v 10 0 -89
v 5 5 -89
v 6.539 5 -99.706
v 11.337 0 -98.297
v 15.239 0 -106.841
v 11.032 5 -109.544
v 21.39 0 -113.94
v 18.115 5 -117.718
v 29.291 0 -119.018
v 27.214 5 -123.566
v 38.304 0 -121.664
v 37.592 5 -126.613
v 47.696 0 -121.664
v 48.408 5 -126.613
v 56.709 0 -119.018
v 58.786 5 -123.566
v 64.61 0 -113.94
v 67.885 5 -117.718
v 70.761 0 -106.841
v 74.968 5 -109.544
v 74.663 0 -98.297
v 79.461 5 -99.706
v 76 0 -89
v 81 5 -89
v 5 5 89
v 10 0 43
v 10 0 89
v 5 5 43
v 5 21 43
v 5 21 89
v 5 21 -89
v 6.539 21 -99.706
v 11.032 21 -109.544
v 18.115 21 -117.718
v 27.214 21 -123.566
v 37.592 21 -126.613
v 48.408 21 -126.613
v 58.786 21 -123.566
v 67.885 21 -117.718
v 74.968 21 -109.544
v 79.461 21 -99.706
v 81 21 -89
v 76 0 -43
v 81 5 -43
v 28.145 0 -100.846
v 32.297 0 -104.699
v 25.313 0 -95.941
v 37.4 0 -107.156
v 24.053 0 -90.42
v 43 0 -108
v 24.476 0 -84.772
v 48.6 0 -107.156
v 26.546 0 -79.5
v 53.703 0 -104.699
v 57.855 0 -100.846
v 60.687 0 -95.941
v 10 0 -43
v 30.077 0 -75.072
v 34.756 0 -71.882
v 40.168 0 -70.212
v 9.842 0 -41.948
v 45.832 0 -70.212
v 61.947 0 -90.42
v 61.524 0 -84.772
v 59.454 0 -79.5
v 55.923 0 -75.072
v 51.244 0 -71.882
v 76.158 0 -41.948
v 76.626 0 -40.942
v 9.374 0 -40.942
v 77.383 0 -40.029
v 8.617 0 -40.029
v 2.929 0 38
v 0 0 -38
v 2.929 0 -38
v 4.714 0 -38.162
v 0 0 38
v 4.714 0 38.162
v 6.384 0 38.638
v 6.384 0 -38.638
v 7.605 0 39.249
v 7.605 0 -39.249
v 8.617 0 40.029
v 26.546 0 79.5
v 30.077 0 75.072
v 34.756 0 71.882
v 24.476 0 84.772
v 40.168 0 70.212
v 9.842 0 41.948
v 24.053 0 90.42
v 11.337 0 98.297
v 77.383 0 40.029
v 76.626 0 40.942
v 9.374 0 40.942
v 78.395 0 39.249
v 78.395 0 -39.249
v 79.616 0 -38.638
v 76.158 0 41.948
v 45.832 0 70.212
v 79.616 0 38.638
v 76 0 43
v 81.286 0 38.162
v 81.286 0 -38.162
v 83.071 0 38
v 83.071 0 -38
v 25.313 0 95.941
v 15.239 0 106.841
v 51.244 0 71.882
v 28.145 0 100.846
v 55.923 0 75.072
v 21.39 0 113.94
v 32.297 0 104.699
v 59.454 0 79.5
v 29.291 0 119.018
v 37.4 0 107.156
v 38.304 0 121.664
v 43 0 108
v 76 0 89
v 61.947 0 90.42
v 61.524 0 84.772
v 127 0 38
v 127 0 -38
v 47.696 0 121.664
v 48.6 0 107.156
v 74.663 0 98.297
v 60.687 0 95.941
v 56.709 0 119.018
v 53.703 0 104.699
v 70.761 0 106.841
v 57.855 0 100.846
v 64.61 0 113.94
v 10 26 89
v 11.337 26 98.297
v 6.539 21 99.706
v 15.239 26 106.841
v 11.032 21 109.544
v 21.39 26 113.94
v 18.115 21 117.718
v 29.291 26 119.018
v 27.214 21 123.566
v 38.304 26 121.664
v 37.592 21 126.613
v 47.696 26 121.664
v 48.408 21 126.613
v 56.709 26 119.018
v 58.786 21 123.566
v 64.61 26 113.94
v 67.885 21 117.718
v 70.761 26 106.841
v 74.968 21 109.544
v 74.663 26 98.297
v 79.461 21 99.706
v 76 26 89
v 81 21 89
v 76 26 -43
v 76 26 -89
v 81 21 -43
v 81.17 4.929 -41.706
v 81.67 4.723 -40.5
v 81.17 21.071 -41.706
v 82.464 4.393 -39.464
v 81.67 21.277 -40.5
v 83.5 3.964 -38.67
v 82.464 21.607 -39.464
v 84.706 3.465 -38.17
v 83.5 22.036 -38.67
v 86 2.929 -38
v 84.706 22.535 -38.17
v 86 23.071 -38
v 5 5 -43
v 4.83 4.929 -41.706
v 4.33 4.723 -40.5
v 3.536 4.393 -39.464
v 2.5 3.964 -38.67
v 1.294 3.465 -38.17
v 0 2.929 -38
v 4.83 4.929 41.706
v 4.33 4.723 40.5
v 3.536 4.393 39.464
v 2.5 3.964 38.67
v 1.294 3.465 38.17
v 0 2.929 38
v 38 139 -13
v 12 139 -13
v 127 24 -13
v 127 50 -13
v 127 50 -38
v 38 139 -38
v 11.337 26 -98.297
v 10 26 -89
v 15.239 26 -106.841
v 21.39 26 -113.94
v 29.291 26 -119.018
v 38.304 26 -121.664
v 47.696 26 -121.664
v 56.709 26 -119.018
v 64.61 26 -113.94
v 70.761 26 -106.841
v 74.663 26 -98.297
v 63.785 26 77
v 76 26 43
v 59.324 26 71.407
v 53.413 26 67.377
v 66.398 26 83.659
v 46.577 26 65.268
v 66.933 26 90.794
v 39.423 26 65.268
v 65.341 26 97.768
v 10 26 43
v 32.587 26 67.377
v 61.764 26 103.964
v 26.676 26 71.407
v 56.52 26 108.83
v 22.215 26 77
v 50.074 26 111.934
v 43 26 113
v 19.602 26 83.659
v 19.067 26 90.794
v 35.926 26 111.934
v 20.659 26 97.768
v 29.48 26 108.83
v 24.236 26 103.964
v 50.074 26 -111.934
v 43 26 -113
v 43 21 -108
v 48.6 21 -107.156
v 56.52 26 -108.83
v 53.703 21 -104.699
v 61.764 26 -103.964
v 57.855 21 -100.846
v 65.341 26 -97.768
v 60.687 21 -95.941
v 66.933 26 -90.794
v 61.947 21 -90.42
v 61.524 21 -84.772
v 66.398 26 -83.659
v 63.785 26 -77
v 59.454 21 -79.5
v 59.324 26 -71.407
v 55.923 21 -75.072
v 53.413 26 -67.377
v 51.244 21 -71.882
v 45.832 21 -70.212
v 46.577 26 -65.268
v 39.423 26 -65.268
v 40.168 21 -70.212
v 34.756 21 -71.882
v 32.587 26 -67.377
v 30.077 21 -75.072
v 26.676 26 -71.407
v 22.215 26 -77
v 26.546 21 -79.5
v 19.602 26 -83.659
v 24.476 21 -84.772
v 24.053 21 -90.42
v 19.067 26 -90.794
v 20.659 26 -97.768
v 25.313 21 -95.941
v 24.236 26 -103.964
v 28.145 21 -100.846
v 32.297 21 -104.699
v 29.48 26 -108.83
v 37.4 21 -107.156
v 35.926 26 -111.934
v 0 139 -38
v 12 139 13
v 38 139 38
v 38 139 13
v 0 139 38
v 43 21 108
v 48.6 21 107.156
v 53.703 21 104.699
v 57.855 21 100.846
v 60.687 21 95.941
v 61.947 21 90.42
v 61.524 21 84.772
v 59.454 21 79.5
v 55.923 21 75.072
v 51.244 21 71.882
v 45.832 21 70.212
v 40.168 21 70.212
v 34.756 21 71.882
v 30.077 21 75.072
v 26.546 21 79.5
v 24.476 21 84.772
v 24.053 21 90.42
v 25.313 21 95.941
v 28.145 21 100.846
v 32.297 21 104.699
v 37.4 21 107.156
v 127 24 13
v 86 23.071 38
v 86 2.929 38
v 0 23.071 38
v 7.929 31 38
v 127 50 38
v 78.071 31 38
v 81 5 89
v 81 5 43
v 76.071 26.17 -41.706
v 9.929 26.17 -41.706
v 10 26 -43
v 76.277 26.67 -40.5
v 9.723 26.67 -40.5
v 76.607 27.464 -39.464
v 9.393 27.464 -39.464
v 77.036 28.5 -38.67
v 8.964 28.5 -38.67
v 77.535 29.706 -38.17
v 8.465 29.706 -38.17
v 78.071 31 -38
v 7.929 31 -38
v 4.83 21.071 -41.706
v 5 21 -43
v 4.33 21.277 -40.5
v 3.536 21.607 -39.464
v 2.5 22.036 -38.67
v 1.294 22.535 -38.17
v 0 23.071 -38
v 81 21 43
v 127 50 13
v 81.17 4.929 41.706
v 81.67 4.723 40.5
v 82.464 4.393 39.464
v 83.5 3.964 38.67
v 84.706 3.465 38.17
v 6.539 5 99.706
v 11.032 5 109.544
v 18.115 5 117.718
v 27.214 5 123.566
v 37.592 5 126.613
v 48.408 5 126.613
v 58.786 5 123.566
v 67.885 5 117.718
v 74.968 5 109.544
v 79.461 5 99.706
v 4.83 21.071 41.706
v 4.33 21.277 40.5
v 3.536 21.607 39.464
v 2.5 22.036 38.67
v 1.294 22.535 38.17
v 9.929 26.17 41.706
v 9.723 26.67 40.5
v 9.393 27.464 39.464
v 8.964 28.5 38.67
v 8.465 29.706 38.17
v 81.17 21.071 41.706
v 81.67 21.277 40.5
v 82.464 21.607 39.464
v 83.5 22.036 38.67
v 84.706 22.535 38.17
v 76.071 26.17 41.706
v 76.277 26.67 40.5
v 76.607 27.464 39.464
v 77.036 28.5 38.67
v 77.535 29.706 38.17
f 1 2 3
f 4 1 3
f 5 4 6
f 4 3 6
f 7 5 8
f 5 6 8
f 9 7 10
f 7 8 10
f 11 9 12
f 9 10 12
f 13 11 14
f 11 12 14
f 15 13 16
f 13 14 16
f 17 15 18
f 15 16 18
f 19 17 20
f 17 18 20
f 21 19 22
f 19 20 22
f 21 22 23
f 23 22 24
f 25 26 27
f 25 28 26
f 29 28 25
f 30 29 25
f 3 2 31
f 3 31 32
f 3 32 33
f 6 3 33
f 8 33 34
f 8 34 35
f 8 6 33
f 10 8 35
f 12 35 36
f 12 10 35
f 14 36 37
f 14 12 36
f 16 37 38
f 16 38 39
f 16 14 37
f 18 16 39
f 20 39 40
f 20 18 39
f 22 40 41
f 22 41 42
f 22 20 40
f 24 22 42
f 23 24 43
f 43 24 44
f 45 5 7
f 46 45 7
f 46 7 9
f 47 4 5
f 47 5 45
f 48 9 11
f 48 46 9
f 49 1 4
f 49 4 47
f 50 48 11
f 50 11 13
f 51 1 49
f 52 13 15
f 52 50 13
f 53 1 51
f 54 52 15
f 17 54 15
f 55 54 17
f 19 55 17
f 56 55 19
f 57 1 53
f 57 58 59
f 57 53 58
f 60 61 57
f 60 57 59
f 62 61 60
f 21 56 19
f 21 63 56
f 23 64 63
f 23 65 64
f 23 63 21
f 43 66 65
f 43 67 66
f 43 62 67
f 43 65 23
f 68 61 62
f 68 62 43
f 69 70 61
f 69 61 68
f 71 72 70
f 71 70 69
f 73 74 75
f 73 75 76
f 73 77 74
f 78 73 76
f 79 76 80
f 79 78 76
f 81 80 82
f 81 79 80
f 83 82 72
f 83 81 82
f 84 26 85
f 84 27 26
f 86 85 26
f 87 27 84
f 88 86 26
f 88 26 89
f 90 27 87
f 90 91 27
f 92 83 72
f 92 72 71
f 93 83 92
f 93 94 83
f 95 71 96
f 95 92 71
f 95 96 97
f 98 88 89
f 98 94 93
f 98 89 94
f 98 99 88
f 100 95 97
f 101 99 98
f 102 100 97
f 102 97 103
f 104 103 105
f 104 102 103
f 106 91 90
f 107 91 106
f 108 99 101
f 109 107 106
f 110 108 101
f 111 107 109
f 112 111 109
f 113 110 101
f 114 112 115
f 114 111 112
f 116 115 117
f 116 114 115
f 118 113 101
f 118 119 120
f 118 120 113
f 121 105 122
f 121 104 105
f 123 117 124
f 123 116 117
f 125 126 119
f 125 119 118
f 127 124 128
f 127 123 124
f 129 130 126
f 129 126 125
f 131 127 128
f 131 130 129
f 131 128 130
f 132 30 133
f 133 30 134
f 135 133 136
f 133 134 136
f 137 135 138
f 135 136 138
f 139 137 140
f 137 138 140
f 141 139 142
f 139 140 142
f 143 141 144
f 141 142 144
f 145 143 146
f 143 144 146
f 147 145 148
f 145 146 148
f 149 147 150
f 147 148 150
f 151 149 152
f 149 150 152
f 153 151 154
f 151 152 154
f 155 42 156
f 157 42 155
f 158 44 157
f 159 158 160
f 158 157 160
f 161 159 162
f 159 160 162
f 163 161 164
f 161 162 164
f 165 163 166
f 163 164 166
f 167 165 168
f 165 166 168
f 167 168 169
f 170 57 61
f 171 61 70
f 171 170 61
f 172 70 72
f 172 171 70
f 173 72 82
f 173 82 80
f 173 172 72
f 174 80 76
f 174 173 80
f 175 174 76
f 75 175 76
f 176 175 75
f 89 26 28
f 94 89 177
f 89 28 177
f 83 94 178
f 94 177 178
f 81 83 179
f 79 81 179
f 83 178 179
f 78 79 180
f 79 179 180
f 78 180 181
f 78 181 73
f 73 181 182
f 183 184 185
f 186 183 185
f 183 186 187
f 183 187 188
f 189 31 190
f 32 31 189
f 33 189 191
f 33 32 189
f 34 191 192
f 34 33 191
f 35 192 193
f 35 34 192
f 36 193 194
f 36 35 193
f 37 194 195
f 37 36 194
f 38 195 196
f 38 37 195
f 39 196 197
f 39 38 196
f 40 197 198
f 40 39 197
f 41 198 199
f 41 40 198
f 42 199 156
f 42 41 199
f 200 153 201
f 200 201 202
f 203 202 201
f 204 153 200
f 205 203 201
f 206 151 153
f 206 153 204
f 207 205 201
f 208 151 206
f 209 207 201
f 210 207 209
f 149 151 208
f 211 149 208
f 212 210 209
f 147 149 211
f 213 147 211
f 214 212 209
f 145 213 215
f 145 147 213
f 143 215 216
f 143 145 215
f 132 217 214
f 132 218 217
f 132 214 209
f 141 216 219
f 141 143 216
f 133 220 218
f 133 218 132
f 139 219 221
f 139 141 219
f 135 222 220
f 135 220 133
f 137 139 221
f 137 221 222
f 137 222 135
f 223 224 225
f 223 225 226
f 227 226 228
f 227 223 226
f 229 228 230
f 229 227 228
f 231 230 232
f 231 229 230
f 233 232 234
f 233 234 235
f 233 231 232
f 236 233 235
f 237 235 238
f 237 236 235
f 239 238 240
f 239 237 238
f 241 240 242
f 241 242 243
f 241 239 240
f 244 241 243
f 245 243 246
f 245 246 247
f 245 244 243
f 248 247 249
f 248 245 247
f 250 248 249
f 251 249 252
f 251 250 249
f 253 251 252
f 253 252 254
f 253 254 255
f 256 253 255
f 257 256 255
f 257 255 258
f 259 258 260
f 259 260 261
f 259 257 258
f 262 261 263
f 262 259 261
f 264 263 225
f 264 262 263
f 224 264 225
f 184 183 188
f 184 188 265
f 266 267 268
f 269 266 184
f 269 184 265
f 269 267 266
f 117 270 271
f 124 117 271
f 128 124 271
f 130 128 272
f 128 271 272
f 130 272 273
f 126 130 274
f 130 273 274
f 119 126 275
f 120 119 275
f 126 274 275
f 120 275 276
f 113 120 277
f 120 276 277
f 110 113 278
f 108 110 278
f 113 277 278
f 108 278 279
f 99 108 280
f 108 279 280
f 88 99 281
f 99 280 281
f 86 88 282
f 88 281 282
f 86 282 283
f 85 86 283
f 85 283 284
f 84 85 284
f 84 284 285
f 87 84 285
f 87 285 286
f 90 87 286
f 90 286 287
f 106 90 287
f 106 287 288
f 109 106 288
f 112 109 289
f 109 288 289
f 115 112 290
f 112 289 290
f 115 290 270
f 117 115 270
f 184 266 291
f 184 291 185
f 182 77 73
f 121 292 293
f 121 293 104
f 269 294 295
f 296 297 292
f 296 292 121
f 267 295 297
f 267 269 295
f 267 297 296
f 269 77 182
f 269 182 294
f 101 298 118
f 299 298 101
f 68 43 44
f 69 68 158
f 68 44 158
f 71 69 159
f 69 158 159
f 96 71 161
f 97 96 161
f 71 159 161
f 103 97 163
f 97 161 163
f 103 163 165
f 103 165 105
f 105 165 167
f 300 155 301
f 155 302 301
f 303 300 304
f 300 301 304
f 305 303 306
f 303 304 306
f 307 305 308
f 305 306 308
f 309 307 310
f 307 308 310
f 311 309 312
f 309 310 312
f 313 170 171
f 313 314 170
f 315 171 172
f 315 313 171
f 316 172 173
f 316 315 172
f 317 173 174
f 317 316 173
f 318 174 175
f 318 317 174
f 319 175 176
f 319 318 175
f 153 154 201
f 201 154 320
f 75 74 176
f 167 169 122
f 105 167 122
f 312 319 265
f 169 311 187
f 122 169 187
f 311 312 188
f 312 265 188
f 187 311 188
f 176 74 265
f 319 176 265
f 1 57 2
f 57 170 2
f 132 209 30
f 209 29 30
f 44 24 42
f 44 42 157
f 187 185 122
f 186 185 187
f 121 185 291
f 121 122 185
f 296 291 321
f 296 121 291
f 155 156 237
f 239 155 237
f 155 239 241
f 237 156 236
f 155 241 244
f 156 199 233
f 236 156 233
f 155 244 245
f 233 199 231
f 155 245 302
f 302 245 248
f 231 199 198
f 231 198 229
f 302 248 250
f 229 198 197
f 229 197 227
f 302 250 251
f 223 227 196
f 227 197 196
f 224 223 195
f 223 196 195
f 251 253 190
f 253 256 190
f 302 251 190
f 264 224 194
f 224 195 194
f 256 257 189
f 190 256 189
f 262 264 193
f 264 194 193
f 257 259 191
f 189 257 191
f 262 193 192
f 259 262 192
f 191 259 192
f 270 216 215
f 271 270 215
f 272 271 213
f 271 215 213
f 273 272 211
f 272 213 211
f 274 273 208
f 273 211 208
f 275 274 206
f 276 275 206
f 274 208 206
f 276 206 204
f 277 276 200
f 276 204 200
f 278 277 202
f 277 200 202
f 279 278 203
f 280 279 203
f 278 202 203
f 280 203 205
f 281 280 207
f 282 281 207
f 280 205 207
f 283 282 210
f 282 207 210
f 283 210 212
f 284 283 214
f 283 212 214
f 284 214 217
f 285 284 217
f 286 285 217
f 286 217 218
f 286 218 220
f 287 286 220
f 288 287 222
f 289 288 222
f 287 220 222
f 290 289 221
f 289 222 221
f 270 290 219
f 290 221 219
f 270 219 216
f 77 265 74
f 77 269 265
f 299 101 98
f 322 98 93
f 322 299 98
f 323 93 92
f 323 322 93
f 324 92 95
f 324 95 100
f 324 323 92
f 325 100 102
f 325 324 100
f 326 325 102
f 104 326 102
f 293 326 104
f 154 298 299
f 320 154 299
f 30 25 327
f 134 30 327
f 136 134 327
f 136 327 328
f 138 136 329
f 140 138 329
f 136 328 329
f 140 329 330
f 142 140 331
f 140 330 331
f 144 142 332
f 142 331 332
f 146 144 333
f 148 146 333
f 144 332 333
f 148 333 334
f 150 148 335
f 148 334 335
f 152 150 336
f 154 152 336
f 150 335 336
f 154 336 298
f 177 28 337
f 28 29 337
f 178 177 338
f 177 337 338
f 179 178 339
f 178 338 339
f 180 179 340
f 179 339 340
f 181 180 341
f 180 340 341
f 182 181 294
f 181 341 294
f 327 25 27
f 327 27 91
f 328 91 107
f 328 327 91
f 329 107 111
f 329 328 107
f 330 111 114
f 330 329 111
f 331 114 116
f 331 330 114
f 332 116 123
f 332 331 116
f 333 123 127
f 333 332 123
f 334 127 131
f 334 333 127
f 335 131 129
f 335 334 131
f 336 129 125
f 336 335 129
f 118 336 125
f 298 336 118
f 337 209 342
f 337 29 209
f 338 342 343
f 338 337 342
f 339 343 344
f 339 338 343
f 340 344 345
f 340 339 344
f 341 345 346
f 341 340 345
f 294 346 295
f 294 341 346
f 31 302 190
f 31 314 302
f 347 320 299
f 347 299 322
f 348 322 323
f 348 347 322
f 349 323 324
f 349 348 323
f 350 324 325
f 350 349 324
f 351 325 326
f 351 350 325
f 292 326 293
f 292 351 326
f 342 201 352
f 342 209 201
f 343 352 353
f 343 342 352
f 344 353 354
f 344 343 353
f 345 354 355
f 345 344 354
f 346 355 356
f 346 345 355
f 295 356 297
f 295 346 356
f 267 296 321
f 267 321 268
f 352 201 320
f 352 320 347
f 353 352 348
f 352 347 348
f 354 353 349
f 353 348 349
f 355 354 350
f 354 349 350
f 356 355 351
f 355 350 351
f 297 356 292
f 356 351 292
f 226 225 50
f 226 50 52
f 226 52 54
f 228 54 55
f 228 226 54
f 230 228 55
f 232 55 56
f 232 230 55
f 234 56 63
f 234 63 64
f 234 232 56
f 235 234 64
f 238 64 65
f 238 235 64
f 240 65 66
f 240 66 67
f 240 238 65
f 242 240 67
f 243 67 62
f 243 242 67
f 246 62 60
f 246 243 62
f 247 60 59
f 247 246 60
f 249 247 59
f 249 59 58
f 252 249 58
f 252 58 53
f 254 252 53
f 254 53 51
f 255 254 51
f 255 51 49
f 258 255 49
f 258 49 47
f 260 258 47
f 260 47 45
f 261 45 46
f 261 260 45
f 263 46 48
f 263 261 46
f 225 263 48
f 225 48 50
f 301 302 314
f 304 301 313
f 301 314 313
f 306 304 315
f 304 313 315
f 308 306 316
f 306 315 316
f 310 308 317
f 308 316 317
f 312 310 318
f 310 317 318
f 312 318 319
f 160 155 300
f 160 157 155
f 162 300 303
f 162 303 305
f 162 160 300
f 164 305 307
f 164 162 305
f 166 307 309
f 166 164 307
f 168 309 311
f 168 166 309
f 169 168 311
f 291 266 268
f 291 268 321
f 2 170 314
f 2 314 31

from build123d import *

# Parameters (mm, degrees)
BOSS_EXTRUDE1_DEPTH      = 38
SKETCH2_W                = 26
SKETCH2_H                = 26
CUT_EXTRUDE1_DEPTH       = 178
BOSS_EXTRUDE2_DEPTH      = 26
CHAMFER2_SIZE            = 5
FILLET4_R                = 5
SKETCH4_R                = 19
CUT_EXTRUDE2_DEPTH       = 26
CHAMFER3_SIZE            = 5
CHAMFER3_OF_MIRROR1_SIZE = 5
CHAMFER4_SIZE            = 5
FILLET5_R                = 5


with BuildPart() as part:
    # Sketch1 → Boss-Extrude1 (new, symmetric)
    with BuildSketch(Plane.XY):
        Polygon((0, 139), (0, 0), (127, 0), (127, 50), (38, 139), align=None)
    extrude(amount=BOSS_EXTRUDE1_DEPTH, both=True)

    # Sketch2 → Cut-Extrude1 (cut, along a direction that is not the sketch's normal)
    with BuildSketch(Plane(origin=(0, 139, 0), x_dir=(1, 0, 0), z_dir=(0, 1, 0))):
        with Locations((25, 0)):
            Rectangle(SKETCH2_W, SKETCH2_H)
    extrude(amount=-CUT_EXTRUDE1_DEPTH, dir=(-0.7071067811865489, 0.7071067811865462, 0), mode=Mode.SUBTRACT)

    # Sketch3 → Boss-Extrude2 (add)
    with BuildSketch(Plane.XZ):
        with BuildLine():
            Line((5, 38), (5, 89))
            ThreePointArc((5, 89), (43, 127), (81, 89))
            Line((81, 89), (81, 38))
            Line((81, 38), (5, 38))
        make_face()
    boss_extrude2 = extrude(amount=-BOSS_EXTRUDE2_DEPTH)

    # Chamfer2
    chamfer2_edges = [part.edges().sort_by_distance(p)[0] for p in [
        (5, 26, 63.5),
        (43, 26, 127),
        (81, 26, 63.5),
        (81, 0, 63.5),
        (43, 0, 127),
        (5, 0, 63.5),
    ]]
    chamfer(chamfer2_edges, length=CHAMFER2_SIZE)

    # Fillet4
    fillet4_edges = [part.edges().sort_by_distance(p)[0] for p in [
        (5, 13, 38),
        (81, 13, 38),
        (43, 26, 38),
        (7.5, 2.5, 38),
        (78.5, 2.5, 38),
        (7.5, 23.5, 38),
        (78.5, 23.5, 38),
    ]]
    fillet(fillet4_edges, radius=FILLET4_R - 0.0001)  # a hair under: the kernel refuses the full size

    # Sketch4 → Cut-Extrude2 (cut)
    with BuildSketch(Plane(origin=(0, 26, 0), x_dir=(1, 0, 0), z_dir=(0, 1, 0))):
        with Locations(Location((43, -89, 0), (0, 0, 270))):
            Circle(SKETCH4_R)
    cut_extrude2 = extrude(amount=-CUT_EXTRUDE2_DEPTH, mode=Mode.SUBTRACT)

    # Chamfer3
    chamfer3_edges = [part.edges().sort_by_distance(p)[0] for p in [
        (43, 26, 70),
    ]]
    chamfer(chamfer3_edges, length=CHAMFER3_SIZE)

    # Mirror1: Boss-Extrude2, Cut-Extrude2 across plane
    add(boss_extrude2.mirror(Plane.XY))
    add(cut_extrude2.mirror(Plane.XY), mode=Mode.SUBTRACT)

    # Chamfer3 of Mirror1
    chamfer3_of_mirror1_edges = [part.edges().sort_by_distance(p)[0] for p in [
        (43, 26, -70),
    ]]
    chamfer(chamfer3_of_mirror1_edges, length=CHAMFER3_OF_MIRROR1_SIZE)

    # Chamfer4
    chamfer4_edges = [part.edges().sort_by_distance(p)[0] for p in [
        (81, 0, -63.5),
        (43, 0, -127),
        (5, 0, -63.5),
        (81, 26, -63.5),
        (43, 26, -127),
        (5, 26, -63.5),
    ]]
    chamfer(chamfer4_edges, length=CHAMFER4_SIZE)

    # Fillet5
    fillet5_edges = [part.edges().sort_by_distance(p)[0] for p in [
        (5, 13, -38),
        (81, 13, -38),
        (43, 26, -38),
        (7.5, 2.5, -38),
        (78.5, 2.5, -38),
        (7.5, 23.5, -38),
        (78.5, 23.5, -38),
    ]]
    fillet(fillet5_edges, radius=FILLET5_R - 0.0001)  # a hair under: the kernel refuses the full size


solid = part.part
